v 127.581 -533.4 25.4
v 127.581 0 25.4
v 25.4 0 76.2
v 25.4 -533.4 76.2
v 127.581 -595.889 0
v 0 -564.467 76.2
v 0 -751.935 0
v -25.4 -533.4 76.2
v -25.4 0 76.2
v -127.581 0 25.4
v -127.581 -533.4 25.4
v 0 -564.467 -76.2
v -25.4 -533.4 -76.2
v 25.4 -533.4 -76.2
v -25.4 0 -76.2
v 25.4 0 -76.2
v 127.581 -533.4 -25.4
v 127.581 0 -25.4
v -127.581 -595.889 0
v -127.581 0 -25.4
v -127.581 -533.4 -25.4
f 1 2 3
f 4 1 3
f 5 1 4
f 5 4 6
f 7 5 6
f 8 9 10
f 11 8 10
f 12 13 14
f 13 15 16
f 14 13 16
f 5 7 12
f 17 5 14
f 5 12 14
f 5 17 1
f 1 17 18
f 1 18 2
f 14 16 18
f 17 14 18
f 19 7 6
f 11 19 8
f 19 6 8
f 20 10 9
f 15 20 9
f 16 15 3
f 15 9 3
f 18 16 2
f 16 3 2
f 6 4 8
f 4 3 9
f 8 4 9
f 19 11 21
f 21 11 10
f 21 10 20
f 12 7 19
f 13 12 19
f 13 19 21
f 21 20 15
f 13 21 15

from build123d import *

# Parameters (mm, degrees)
F1_DEPTH    = 762
F2_T1_DEPTH = 1300.1781500313
F2_T3_DEPTH = 1300.1781500313
F2_T5_DEPTH = 1300.1781500313
F2_T7_DEPTH = 1300.1781500313


# Not quite as in the source:
# - a fillet or chamfer that OpenCascade refuses, or shapes differently, is made with other operations: its cross-section is extruded or revolved along the edge and cut away or added


with BuildPart() as f1:
    # F0 (on Front) → F1 (new body)
    with BuildSketch(Plane.XZ):
        Polygon((25.4, 76.2), (0, 76.2), (-25.4, 76.2), (-127.5811195374, 25.4), (-127.5811195374, 0), (-127.5811195374, -25.4), (-25.4, -76.2), (0, -76.2), (25.4, -76.2), (127.5811195374, -25.4), (127.5811195374, 0), (127.5811195374, 25.4), align=None)
    extrude(amount=F1_DEPTH)

    # F2: chamfer of 228.6 x 83.2035955533 on 4 edges, made by hand

    # F2_s2 → F2_t1 (cut)
    with BuildSketch(Plane(origin=(541.036756959, 0, 268.9798993978), x_dir=(0, 1, 0), z_dir=(-0.8954433759, 0, -0.4451754267))):
        Polygon((-762, 3.6633544712), (-533.4, -79.540241082), (-762, -79.540241082), align=None)
    extrude(amount=F2_T1_DEPTH, mode=Mode.SUBTRACT)

    # F2_s4 → F2_t3 (cut)
    with BuildSketch(Plane(origin=(623.1991549624, 0, -309.8274633849), x_dir=(0, 1, 0), z_dir=(-0.8954433759, 0, 0.4451754267))):
        Polygon((-533.4, -79.540241082), (-762, 3.6633544712), (-762, -79.540241082), align=None)
    extrude(amount=F2_T3_DEPTH, mode=Mode.SUBTRACT)

    # F2_s6 → F2_t5 (cut)
    with BuildSketch(Plane(origin=(-541.036756959, 0, -268.9798993978), x_dir=(0, 1, 0), z_dir=(0.8954433759, 0, 0.4451754267))):
        Polygon((-762, 3.6633544712), (-533.4, -79.540241082), (-762, -79.540241082), align=None)
    extrude(amount=F2_T5_DEPTH, mode=Mode.SUBTRACT)

    # F2_s8 → F2_t7 (cut)
    with BuildSketch(Plane(origin=(-623.1991549624, 0, 309.8274633849), x_dir=(0, 1, 0), z_dir=(0.8954433759, 0, -0.4451754267))):
        Polygon((-762, 3.6633544712), (-533.4, -79.540241082), (-762, -79.540241082), align=None)
    extrude(amount=F2_T7_DEPTH, mode=Mode.SUBTRACT)


solid = f1.part
